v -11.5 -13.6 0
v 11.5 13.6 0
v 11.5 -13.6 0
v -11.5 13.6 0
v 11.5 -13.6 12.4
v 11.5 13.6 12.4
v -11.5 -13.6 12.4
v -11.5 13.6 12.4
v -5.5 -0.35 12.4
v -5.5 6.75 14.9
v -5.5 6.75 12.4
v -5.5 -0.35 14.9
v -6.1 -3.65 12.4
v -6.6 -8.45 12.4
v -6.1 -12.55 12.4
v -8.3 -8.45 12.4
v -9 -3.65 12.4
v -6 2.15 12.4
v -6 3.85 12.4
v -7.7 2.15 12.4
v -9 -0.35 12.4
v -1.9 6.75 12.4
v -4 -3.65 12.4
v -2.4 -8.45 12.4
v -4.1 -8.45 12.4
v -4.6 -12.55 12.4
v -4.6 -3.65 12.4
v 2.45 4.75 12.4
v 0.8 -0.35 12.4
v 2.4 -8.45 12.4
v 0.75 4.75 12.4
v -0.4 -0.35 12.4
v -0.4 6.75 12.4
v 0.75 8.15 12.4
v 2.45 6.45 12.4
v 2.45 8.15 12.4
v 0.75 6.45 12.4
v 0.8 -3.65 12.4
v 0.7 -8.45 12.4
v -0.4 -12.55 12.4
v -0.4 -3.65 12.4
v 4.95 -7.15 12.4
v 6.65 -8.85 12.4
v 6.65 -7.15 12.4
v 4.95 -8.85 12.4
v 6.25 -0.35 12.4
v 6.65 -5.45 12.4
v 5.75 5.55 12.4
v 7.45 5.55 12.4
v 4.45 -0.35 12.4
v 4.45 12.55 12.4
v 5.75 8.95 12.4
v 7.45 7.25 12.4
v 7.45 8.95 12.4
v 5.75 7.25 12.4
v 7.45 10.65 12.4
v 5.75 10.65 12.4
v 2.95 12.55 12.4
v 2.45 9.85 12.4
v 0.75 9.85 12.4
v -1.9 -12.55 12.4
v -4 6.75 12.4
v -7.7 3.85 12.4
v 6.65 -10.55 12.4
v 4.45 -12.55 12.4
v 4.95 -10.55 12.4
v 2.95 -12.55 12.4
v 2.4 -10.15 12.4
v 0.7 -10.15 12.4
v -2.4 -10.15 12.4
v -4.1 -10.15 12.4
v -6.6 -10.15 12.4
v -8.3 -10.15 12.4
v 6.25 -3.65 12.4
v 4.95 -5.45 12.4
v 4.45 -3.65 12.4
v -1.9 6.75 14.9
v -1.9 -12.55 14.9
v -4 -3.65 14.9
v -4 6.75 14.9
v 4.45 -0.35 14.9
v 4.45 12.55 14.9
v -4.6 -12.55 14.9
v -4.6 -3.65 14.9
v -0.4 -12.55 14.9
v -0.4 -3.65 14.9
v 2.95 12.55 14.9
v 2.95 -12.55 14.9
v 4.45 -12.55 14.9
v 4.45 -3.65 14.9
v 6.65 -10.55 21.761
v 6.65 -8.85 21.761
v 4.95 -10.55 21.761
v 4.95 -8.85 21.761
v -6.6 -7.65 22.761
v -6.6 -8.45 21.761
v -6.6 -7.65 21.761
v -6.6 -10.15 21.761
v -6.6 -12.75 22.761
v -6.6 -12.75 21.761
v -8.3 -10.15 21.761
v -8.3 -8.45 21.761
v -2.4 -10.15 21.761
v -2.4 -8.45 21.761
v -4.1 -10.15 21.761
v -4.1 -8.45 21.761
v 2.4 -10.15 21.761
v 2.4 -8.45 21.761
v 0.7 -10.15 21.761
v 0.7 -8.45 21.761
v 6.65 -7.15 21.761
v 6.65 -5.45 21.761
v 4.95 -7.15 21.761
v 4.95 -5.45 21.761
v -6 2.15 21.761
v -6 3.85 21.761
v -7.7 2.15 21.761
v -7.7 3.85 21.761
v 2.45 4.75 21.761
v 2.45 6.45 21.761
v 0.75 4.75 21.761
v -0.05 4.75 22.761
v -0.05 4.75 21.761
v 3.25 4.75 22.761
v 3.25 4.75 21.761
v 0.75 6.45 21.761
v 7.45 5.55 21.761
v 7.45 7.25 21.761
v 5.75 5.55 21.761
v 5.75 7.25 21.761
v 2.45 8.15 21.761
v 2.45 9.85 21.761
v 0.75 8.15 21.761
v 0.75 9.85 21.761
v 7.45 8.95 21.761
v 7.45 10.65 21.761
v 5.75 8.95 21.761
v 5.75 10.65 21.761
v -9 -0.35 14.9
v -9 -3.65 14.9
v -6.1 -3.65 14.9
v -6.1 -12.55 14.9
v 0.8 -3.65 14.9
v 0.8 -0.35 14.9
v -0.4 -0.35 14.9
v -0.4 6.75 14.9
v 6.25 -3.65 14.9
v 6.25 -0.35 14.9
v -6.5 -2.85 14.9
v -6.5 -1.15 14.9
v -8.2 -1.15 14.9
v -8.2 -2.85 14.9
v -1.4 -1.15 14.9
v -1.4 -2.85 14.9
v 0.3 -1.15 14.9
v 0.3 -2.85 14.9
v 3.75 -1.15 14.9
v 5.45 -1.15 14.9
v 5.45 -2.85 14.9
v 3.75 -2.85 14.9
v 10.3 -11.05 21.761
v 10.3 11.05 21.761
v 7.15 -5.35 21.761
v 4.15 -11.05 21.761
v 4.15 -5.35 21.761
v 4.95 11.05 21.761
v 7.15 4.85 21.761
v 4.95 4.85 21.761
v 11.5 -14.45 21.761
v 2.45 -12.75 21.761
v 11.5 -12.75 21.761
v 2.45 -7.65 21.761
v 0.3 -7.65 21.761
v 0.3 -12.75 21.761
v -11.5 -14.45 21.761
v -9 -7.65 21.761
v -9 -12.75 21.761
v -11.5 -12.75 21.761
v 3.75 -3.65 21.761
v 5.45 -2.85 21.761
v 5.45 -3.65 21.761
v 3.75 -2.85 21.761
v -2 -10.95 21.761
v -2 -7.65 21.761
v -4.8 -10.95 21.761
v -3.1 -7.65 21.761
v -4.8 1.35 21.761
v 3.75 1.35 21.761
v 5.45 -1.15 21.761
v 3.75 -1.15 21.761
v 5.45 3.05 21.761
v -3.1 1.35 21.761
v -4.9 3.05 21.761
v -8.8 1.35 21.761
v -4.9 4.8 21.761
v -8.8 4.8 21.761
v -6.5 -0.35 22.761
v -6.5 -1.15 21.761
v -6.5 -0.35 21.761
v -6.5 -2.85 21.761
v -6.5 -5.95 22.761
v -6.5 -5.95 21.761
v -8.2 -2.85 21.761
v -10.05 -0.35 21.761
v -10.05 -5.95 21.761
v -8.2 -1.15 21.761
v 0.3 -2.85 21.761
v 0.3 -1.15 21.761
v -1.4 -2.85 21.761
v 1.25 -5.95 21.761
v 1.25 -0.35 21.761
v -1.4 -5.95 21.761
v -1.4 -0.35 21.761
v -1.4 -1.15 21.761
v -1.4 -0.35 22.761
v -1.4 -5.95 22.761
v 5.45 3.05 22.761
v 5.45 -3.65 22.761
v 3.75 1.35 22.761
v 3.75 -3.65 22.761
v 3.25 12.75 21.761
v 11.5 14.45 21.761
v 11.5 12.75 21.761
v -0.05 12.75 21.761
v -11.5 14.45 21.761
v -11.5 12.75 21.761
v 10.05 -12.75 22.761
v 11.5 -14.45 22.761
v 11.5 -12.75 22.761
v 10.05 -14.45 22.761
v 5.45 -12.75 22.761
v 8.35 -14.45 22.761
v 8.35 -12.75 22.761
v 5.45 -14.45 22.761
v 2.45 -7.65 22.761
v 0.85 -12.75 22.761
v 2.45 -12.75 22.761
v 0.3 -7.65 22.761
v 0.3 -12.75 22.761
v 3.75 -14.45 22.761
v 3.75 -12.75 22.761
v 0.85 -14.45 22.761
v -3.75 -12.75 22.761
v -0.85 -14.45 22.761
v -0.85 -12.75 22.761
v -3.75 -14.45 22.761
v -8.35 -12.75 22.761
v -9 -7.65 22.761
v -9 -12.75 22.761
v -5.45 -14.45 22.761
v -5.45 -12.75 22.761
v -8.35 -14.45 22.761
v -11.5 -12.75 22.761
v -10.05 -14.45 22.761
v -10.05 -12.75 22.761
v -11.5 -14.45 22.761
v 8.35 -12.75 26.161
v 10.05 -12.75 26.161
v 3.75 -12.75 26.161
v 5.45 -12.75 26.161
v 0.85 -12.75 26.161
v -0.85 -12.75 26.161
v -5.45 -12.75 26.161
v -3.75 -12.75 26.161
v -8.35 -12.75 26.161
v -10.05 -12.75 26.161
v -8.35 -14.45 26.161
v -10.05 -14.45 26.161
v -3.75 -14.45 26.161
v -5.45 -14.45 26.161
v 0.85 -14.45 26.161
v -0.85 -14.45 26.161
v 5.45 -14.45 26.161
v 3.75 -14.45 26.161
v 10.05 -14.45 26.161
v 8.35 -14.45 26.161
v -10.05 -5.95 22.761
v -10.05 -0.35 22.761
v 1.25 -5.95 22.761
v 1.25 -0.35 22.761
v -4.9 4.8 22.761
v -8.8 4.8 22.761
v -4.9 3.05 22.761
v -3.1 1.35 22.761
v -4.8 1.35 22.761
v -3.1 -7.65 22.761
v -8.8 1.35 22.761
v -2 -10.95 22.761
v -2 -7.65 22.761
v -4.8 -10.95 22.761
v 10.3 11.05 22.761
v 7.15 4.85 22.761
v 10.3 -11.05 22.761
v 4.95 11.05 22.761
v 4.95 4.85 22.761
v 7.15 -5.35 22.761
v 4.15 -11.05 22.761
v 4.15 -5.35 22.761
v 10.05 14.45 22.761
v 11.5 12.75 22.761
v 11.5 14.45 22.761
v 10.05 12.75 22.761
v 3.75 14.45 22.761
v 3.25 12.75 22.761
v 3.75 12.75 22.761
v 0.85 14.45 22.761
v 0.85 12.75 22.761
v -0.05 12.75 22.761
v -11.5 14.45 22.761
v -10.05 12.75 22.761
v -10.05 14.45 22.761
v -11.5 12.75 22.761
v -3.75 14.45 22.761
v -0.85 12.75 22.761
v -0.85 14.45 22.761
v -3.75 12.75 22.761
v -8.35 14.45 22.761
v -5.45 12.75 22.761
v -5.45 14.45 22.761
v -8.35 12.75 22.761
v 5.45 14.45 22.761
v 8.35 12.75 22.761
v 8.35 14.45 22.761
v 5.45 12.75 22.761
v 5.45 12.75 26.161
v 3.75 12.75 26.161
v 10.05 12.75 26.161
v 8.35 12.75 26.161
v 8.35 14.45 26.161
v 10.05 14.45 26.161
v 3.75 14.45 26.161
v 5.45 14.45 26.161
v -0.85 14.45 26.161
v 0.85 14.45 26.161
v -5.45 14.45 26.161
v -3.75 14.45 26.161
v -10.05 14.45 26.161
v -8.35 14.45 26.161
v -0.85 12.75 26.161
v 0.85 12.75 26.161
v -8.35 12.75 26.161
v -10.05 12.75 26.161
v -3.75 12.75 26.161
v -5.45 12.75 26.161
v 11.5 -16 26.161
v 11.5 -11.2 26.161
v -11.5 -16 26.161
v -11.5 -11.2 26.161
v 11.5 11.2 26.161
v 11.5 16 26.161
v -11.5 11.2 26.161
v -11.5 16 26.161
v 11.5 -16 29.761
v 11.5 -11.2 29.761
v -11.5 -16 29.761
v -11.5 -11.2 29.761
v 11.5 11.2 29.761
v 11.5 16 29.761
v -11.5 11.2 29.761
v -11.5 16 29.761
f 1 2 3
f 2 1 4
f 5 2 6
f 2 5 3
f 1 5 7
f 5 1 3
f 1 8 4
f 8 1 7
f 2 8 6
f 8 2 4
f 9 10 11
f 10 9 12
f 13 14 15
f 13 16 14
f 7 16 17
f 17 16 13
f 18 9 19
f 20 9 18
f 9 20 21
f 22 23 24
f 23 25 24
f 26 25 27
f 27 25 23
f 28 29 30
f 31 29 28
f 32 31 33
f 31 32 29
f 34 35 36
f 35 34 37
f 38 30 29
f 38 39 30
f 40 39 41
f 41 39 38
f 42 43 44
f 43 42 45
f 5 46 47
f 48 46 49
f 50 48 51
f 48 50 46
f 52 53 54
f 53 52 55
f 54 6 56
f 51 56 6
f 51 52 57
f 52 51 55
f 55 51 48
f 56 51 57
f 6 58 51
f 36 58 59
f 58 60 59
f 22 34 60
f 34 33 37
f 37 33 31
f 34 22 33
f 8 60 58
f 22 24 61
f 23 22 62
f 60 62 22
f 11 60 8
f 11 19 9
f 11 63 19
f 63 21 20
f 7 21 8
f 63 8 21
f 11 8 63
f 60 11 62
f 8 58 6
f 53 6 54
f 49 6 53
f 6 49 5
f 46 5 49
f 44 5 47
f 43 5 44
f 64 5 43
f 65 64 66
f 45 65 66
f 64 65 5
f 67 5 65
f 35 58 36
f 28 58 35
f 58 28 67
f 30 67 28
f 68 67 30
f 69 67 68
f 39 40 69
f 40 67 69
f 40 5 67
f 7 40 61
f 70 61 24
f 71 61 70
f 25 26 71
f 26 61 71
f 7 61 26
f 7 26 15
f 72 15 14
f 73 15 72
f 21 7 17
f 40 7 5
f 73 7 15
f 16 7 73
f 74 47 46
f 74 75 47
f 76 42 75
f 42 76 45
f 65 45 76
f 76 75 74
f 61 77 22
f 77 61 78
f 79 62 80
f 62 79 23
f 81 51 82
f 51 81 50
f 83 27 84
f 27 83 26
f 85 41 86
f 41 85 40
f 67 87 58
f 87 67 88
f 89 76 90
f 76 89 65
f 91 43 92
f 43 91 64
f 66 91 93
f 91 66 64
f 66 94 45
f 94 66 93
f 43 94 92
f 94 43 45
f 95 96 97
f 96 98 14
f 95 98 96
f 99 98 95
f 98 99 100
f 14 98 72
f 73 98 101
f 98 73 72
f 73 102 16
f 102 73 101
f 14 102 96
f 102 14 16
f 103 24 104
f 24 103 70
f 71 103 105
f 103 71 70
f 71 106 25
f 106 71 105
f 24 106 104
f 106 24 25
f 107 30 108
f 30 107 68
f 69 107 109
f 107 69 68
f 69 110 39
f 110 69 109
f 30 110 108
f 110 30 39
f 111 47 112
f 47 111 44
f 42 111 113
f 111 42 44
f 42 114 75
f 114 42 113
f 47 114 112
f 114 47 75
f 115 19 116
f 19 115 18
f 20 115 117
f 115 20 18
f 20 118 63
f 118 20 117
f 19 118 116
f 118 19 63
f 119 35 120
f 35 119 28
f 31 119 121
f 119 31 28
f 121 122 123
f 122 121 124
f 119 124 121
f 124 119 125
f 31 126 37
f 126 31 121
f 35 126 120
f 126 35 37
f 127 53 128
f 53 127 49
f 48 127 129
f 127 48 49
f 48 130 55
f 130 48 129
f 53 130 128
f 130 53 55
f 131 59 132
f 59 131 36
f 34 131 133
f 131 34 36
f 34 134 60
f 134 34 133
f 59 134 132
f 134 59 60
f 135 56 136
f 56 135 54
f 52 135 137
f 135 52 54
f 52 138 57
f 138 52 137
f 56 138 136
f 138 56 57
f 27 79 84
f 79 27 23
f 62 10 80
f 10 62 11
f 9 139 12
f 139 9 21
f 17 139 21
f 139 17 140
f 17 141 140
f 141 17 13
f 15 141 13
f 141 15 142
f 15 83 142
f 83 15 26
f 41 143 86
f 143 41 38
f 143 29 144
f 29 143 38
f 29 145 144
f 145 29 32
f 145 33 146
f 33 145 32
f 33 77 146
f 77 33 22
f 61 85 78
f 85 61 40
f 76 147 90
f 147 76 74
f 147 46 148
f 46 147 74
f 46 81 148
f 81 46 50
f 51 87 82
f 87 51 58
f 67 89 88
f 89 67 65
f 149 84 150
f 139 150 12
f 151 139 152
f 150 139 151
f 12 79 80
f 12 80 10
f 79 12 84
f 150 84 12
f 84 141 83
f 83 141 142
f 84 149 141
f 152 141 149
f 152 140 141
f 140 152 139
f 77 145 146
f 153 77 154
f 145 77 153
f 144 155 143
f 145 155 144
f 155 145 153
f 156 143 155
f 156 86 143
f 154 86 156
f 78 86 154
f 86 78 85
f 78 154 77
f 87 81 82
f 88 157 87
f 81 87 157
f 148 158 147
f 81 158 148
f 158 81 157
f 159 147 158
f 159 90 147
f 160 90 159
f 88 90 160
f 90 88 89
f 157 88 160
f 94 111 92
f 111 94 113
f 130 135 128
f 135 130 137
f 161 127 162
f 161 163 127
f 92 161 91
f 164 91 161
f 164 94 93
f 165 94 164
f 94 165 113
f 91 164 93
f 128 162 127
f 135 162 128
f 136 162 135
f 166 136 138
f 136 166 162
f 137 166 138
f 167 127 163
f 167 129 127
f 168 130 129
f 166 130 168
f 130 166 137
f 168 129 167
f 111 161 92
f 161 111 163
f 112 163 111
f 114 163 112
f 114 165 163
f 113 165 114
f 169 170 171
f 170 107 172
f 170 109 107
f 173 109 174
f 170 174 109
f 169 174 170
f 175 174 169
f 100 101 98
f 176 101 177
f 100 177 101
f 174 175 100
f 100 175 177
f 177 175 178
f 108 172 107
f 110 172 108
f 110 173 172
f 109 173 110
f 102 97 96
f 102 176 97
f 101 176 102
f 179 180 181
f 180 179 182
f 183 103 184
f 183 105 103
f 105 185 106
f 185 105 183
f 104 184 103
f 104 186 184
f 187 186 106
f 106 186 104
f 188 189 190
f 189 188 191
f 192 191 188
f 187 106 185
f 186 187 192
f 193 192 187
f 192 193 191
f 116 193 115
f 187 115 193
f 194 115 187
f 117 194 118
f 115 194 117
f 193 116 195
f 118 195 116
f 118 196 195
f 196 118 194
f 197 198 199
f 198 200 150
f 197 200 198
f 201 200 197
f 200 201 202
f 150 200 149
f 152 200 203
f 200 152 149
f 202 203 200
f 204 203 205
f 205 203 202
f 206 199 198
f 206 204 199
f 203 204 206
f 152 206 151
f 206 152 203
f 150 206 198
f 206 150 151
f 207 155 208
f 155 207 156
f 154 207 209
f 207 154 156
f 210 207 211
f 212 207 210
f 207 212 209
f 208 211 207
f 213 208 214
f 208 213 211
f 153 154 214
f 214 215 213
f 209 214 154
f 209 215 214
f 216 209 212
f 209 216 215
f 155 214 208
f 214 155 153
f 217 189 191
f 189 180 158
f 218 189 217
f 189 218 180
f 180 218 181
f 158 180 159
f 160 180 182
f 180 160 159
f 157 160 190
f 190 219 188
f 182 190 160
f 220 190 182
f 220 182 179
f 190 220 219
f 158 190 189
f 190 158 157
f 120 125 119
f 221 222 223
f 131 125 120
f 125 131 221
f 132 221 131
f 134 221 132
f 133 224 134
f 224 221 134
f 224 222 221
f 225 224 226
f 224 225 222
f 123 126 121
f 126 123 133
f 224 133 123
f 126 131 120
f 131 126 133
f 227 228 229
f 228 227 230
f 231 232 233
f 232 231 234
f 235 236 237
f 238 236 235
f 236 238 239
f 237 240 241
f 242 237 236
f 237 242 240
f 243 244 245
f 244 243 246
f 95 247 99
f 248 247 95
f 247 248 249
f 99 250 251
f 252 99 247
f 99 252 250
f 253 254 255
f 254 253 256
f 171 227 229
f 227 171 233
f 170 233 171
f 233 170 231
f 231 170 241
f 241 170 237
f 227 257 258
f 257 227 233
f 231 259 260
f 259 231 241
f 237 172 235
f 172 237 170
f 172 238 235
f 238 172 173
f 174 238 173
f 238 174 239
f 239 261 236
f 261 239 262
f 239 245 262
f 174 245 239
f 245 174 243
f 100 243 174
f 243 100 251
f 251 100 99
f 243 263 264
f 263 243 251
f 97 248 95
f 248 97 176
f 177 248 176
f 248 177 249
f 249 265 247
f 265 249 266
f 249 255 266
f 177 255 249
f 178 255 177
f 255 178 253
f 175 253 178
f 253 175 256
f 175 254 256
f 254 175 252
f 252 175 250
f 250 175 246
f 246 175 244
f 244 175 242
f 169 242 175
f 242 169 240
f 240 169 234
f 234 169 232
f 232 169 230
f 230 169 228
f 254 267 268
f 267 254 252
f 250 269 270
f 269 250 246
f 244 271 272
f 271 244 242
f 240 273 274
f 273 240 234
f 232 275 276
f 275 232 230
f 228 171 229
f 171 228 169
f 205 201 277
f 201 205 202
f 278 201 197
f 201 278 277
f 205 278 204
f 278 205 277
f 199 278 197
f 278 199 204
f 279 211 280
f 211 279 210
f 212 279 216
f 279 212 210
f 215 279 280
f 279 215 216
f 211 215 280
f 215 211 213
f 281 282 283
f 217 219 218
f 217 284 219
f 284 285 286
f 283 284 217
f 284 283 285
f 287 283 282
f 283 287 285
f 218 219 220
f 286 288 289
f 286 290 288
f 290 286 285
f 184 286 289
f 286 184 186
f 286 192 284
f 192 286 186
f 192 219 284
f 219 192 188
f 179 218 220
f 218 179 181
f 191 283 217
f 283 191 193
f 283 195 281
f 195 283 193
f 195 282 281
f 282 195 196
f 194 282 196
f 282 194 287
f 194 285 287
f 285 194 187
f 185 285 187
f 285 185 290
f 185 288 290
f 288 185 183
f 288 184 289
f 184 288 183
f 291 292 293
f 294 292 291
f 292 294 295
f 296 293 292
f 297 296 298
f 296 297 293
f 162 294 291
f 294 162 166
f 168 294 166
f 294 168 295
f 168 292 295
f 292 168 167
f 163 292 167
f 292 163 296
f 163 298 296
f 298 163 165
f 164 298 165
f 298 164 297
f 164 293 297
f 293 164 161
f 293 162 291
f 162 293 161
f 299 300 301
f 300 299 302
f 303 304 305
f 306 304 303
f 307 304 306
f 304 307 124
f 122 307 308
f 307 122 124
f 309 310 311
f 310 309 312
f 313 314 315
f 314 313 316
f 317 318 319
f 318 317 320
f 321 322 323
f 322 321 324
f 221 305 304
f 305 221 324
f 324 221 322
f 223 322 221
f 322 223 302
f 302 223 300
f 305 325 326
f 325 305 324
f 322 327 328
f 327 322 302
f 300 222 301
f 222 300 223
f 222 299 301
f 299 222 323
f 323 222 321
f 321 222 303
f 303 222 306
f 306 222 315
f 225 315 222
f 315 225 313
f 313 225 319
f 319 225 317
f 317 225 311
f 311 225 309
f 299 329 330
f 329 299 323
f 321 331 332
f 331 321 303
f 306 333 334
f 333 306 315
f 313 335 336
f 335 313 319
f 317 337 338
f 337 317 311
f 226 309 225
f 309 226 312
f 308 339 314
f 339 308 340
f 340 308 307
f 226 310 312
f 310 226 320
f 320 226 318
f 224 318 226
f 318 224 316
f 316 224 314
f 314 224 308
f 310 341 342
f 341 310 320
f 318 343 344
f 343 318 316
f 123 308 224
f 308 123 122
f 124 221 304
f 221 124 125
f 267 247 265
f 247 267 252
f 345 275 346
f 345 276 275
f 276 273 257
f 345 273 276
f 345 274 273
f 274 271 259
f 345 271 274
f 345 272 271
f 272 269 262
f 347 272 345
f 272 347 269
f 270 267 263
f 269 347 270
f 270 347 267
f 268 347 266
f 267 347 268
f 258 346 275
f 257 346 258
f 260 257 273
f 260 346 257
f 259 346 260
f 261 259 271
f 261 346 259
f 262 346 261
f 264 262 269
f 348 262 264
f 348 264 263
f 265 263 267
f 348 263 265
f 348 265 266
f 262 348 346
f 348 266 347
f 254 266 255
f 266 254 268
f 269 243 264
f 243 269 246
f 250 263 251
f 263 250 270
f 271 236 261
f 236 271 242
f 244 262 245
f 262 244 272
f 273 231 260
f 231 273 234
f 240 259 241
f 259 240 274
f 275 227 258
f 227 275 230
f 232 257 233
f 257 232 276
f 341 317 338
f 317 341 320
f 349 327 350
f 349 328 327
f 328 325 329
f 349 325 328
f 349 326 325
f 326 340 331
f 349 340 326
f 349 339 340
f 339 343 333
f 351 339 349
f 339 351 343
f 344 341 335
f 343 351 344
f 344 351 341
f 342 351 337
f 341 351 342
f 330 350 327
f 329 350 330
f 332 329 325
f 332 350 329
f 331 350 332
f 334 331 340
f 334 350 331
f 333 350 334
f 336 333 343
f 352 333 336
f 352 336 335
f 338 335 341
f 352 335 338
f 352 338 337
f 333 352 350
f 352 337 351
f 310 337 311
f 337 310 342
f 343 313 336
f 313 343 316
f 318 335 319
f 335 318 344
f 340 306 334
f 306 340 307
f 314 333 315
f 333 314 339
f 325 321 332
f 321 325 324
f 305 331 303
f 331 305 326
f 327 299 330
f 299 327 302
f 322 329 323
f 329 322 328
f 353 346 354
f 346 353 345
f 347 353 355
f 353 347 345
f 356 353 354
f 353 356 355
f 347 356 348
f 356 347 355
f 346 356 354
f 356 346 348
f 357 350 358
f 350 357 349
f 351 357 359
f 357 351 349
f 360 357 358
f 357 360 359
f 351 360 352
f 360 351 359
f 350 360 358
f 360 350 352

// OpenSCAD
// Generated by SolidPython 0.4.2 on 2020-09-29 23:22:09
//!OpenSCAD

scale(v = 0.0100000000) {
	translate(v = [-1150, -1360, 0]) {
		union() {
			color(c = [0.4000000000, 0.4000000000, 0.4000000000]) {
				translate(v = [0, 0, 0]) {
					linear_extrude(height = 1000.0000000000) {
						polygon(paths = [[0, 1, 2, 3]], points = [[0, 0], [0, 2720], [2300, 2720], [2300, 0]]);
					}
				}
			}
			color(c = [0.2000000000, 0.6000000000, 0.2000000000]) {
				translate(v = [0, 0, 1000.0000000000]) {
					linear_extrude(height = 120.0000000000) {
						polygon(paths = [[0, 1, 2, 3]], points = [[0, 1305], [0, 2720], [2300, 2720], [2300, 1305]]);
					}
				}
			}
			color(c = [0.4000000000, 0.4000000000, 0.4000000000]) {
				translate(v = [0, 0, 1000.0000000000]) {
					linear_extrude(height = 120.0000000000) {
						polygon(paths = [[0, 1, 2, 3]], points = [[0, 0], [0, 1305], [2300, 1305], [2300, 0]]);
					}
				}
			}
			color(c = [0.9000000000, 0.6000000000, 0.6000000000]) {
				translate(v = [0, 0, 1120.0000000000]) {
					linear_extrude(height = 120.0000000000) {
						polygon(paths = [[0, 1, 2, 3]], points = [[340, 1485], [340, 1905], [600, 1905], [600, 1485]]);
					}
				}
			}
			color(c = [0.9000000000, 0.6000000000, 0.6000000000]) {
				translate(v = [0, 0, 1120.0000000000]) {
					linear_extrude(height = 120.0000000000) {
						polygon(paths = [[0, 1, 2, 3]], points = [[750, 1485], [750, 1905], [960, 1905], [960, 1485]]);
					}
				}
			}
			color(c = [0.9000000000, 0.6000000000, 0.6000000000]) {
				translate(v = [0, 0, 1120.0000000000]) {
					linear_extrude(height = 120.0000000000) {
						polygon(paths = [[0, 1, 2, 3, 4, 5]], points = [[1110, 1485], [1110, 1905], [1185, 1905], [1185, 2485], [1445, 2485], [1445, 1485]]);
					}
				}
			}
			color(c = [0.9000000000, 0.6000000000, 0.6000000000]) {
				translate(v = [0, 0, 1120.0000000000]) {
					linear_extrude(height = 120.0000000000) {
						polygon(paths = [[0, 1, 2, 3]], points = [[1595, 1485], [1595, 2485], [1935, 2485], [1935, 1485]]);
					}
				}
			}
			color(c = [0.9000000000, 0.6000000000, 0.9000000000]) {
				translate(v = [0, 0, 1120.0000000000]) {
					linear_extrude(height = 120.0000000000) {
						polygon(paths = [[0, 1, 2, 3]], points = [[280, 235], [280, 655], [540, 655], [540, 235]]);
					}
				}
			}
			color(c = [0.9000000000, 0.6000000000, 0.9000000000]) {
				translate(v = [0, 0, 1120.0000000000]) {
					linear_extrude(height = 120.0000000000) {
						polygon(paths = [[0, 1, 2, 3]], points = [[690, 235], [690, 655], [960, 655], [960, 235]]);
					}
				}
			}
			color(c = [0.9000000000, 0.6000000000, 0.9000000000]) {
				translate(v = [0, 0, 1120.0000000000]) {
					linear_extrude(height = 120.0000000000) {
						polygon(paths = [[0, 1, 2, 3, 4, 5]], points = [[1110, 235], [1110, 655], [1185, 655], [1185, 885], [1445, 885], [1445, 235]]);
					}
				}
			}
			color(c = [0.9000000000, 0.6000000000, 0.9000000000]) {
				translate(v = [0, 0, 1120.0000000000]) {
					linear_extrude(height = 120.0000000000) {
						polygon(paths = [[0, 1, 2, 3]], points = [[1595, 235], [1595, 885], [1855, 885], [1855, 235]]);
					}
				}
			}
			color(c = [0.2000000000, 0.6000000000, 0.2000000000]) {
				translate(v = [0, 0, 1120.0000000000]) {
					linear_extrude(height = 120.0000000000) {
						difference() {
							polygon(paths = [[0, 1, 2, 3]], points = [[0, 1305], [0, 2720], [2300, 2720], [2300, 1305]]);
							polygon(paths = [[0, 1, 2, 3]], points = [[340, 1485], [600, 1485], [600, 1905], [340, 1905]]);
							polygon(paths = [[0, 1, 2, 3]], points = [[750, 1485], [960, 1485], [960, 1905], [750, 1905]]);
							polygon(paths = [[0, 1, 2, 3]], points = [[1595, 1485], [1935, 1485], [1935, 2485], [1595, 2485]]);
							polygon(paths = [[0, 1, 2, 3, 4, 5]], points = [[1110, 1485], [1445, 1485], [1445, 2485], [1185, 2485], [1185, 1905], [1110, 1905]]);
						}
					}
				}
			}
			color(c = [0.4000000000, 0.4000000000, 0.4000000000]) {
				translate(v = [0, 0, 1120.0000000000]) {
					linear_extrude(height = 120.0000000000) {
						difference() {
							polygon(paths = [[0, 1, 2, 3]], points = [[0, 0], [0, 1305], [2300, 1305], [2300, 0]]);
							polygon(paths = [[0, 1, 2, 3]], points = [[280, 235], [540, 235], [540, 655], [280, 655]]);
							polygon(paths = [[0, 1, 2, 3]], points = [[690, 235], [960, 235], [960, 655], [690, 655]]);
							polygon(paths = [[0, 1, 2, 3]], points = [[1595, 235], [1855, 235], [1855, 885], [1595, 885]]);
							polygon(paths = [[0, 1, 2, 3, 4, 5]], points = [[1110, 235], [1445, 235], [1445, 885], [1185, 885], [1185, 655], [1110, 655]]);
						}
					}
				}
			}
			color(c = [0.1000000000, 0.1000000000, 0.1000000000]) {
				translate(v = [0, 0, 1240.0000000000]) {
					linear_extrude(height = 70.0000000000) {
						polygon(paths = [[0, 1, 2, 3]], points = [[1645, 305], [1645, 475], [1815, 475], [1815, 305]]);
					}
				}
			}
			color(c = [0.1000000000, 0.1000000000, 0.1000000000]) {
				translate(v = [0, 0, 1240.0000000000]) {
					linear_extrude(height = 70.0000000000) {
						polygon(paths = [[0, 1, 2, 3]], points = [[320, 345], [320, 515], [490, 515], [490, 345]]);
					}
				}
			}
			color(c = [0.1000000000, 0.1000000000, 0.1000000000]) {
				translate(v = [0, 0, 1240.0000000000]) {
					linear_extrude(height = 70.0000000000) {
						polygon(paths = [[0, 1, 2, 3]], points = [[740, 345], [740, 515], [910, 515], [910, 345]]);
					}
				}
			}
			color(c = [0.1000000000, 0.1000000000, 0.1000000000]) {
				translate(v = [0, 0, 1240.0000000000]) {
					linear_extrude(height = 70.0000000000) {
						polygon(paths = [[0, 1, 2, 3]], points = [[1220, 345], [1220, 515], [1390, 515], [1390, 345]]);
					}
				}
			}
			color(c = [0.1000000000, 0.1000000000, 0.1000000000]) {
				translate(v = [0, 0, 1240.0000000000]) {
					linear_extrude(height = 70.0000000000) {
						polygon(paths = [[0, 1, 2, 3]], points = [[1645, 645], [1645, 815], [1815, 815], [1815, 645]]);
					}
				}
			}
			color(c = [0.1000000000, 0.1000000000, 0.1000000000]) {
				translate(v = [0, 0, 1240.0000000000]) {
					linear_extrude(height = 70.0000000000) {
						polygon(paths = [[0, 1, 2, 3]], points = [[380, 1575], [380, 1745], [550, 1745], [550, 1575]]);
					}
				}
			}
			color(c = [0.1000000000, 0.1000000000, 0.1000000000]) {
				translate(v = [0, 0, 1240.0000000000]) {
					linear_extrude(height = 70.0000000000) {
						polygon(paths = [[0, 1, 2, 3]], points = [[1225, 1835], [1225, 2005], [1395, 2005], [1395, 1835]]);
					}
				}
			}
			color(c = [0.1000000000, 0.1000000000, 0.1000000000]) {
				translate(v = [0, 0, 1240.0000000000]) {
					linear_extrude(height = 70.0000000000) {
						polygon(paths = [[0, 1, 2, 3]], points = [[1725, 1915], [1725, 2085], [1895, 2085], [1895, 1915]]);
					}
				}
			}
			color(c = [0.1000000000, 0.1000000000, 0.1000000000]) {
				translate(v = [0, 0, 1240.0000000000]) {
					linear_extrude(height = 70.0000000000) {
						polygon(paths = [[0, 1, 2, 3]], points = [[1225, 2175], [1225, 2345], [1395, 2345], [1395, 2175]]);
					}
				}
			}
			color(c = [0.1000000000, 0.1000000000, 0.1000000000]) {
				translate(v = [0, 0, 1240.0000000000]) {
					linear_extrude(height = 70.0000000000) {
						polygon(paths = [[0, 1, 2, 3]], points = [[1725, 2255], [1725, 2425], [1895, 2425], [1895, 2255]]);
					}
				}
			}
			color(c = [1.0000000000, 1.0000000000, 1.0000000000]) {
				translate(v = [0, 0, 1240.0000000000]) {
					linear_extrude(height = 70.0000000000) {
						polygon(paths = [[0, 1, 2, 3, 4, 5, 6, 7, 8, 9]], points = [[540, 105], [540, 995], [250, 995], [250, 1325], [600, 1325], [600, 2035], [750, 2035], [750, 995], [690, 995], [690, 105]]);
					}
				}
			}
			color(c = [1.0000000000, 1.0000000000, 1.0000000000]) {
				translate(v = [0, 0, 1240.0000000000]) {
					linear_extrude(height = 70.0000000000) {
						polygon(paths = [[0, 1, 2, 3, 4, 5, 6, 7]], points = [[960, 105], [960, 2035], [1110, 2035], [1110, 1325], [1230, 1325], [1230, 995], [1110, 995], [1110, 105]]);
					}
				}
			}
			color(c = [1.0000000000, 1.0000000000, 1.0000000000]) {
				translate(v = [0, 0, 1240.0000000000]) {
					linear_extrude(height = 70.0000000000) {
						polygon(paths = [[0, 1, 2, 3, 4, 5, 6, 7]], points = [[1445, 105], [1445, 2615], [1595, 2615], [1595, 1325], [1775, 1325], [1775, 995], [1595, 995], [1595, 105]]);
					}
				}
			}
			color(c = [0.1000000000, 0.1000000000, 0.1000000000]) {
				translate(v = [0, 0, 1310.0000000000]) {
					linear_extrude(height = 180.0000000000) {
						polygon(paths = [[0, 1, 2, 3]], points = [[1645, 305], [1645, 475], [1815, 475], [1815, 305]]);
					}
				}
			}
			color(c = [0.1000000000, 0.1000000000, 0.1000000000]) {
				translate(v = [0, 0, 1310.0000000000]) {
					linear_extrude(height = 180.0000000000) {
						polygon(paths = [[0, 1, 2, 3]], points = [[320, 345], [320, 515], [490, 515], [490, 345]]);
					}
				}
			}
			color(c = [0.1000000000, 0.1000000000, 0.1000000000]) {
				translate(v = [0, 0, 1310.0000000000]) {
					linear_extrude(height = 180.0000000000) {
						polygon(paths = [[0, 1, 2, 3]], points = [[740, 345], [740, 515], [910, 515], [910, 345]]);
					}
				}
			}
			color(c = [0.1000000000, 0.1000000000, 0.1000000000]) {
				translate(v = [0, 0, 1310.0000000000]) {
					linear_extrude(height = 180.0000000000) {
						polygon(paths = [[0, 1, 2, 3]], points = [[1220, 345], [1220, 515], [1390, 515], [1390, 345]]);
					}
				}
			}
			color(c = [0.1000000000, 0.1000000000, 0.1000000000]) {
				translate(v = [0, 0, 1310.0000000000]) {
					linear_extrude(height = 180.0000000000) {
						polygon(paths = [[0, 1, 2, 3]], points = [[1645, 645], [1645, 815], [1815, 815], [1815, 645]]);
					}
				}
			}
			color(c = [0.1000000000, 0.1000000000, 0.1000000000]) {
				translate(v = [0, 0, 1310.0000000000]) {
					linear_extrude(height = 180.0000000000) {
						polygon(paths = [[0, 1, 2, 3]], points = [[380, 1575], [380, 1745], [550, 1745], [550, 1575]]);
					}
				}
			}
			color(c = [0.1000000000, 0.1000000000, 0.1000000000]) {
				translate(v = [0, 0, 1310.0000000000]) {
					linear_extrude(height = 180.0000000000) {
						polygon(paths = [[0, 1, 2, 3]], points = [[1225, 1835], [1225, 2005], [1395, 2005], [1395, 1835]]);
					}
				}
			}
			color(c = [0.1000000000, 0.1000000000, 0.1000000000]) {
				translate(v = [0, 0, 1310.0000000000]) {
					linear_extrude(height = 180.0000000000) {
						polygon(paths = [[0, 1, 2, 3]], points = [[1725, 1915], [1725, 2085], [1895, 2085], [1895, 1915]]);
					}
				}
			}
			color(c = [0.1000000000, 0.1000000000, 0.1000000000]) {
				translate(v = [0, 0, 1310.0000000000]) {
					linear_extrude(height = 180.0000000000) {
						polygon(paths = [[0, 1, 2, 3]], points = [[1225, 2175], [1225, 2345], [1395, 2345], [1395, 2175]]);
					}
				}
			}
			color(c = [0.1000000000, 0.1000000000, 0.1000000000]) {
				translate(v = [0, 0, 1310.0000000000]) {
					linear_extrude(height = 180.0000000000) {
						polygon(paths = [[0, 1, 2, 3]], points = [[1725, 2255], [1725, 2425], [1895, 2425], [1895, 2255]]);
					}
				}
			}
			color(c = [0.7000000000, 0, 0]) {
				translate(v = [0, 0, 1310.0000000000]) {
					linear_extrude(height = 180.0000000000) {
						polygon(paths = [[0, 1, 2, 3, 4, 5, 6, 7, 8, 9]], points = [[540, 105], [540, 995], [250, 995], [250, 1325], [600, 1325], [600, 2035], [750, 2035], [750, 995], [690, 995], [690, 105]]);
					}
				}
			}
			color(c = [0.7000000000, 0, 0]) {
				translate(v = [0, 0, 1310.0000000000]) {
					linear_extrude(height = 180.0000000000) {
						polygon(paths = [[0, 1, 2, 3, 4, 5, 6, 7]], points = [[960, 105], [960, 2035], [1110, 2035], [1110, 1325], [1230, 1325], [1230, 995], [1110, 995], [1110, 105]]);
					}
				}
			}
			color(c = [0.7000000000, 0, 0]) {
				translate(v = [0, 0, 1310.0000000000]) {
					linear_extrude(height = 180.0000000000) {
						polygon(paths = [[0, 1, 2, 3, 4, 5, 6, 7]], points = [[1445, 105], [1445, 2615], [1595, 2615], [1595, 1325], [1775, 1325], [1775, 995], [1595, 995], [1595, 105]]);
					}
				}
			}
			color(c = [0.1000000000, 0.1000000000, 0.1000000000]) {
				translate(v = [0, 0, 1490.0000000000]) {
					linear_extrude(height = 686.1000000000) {
						polygon(paths = [[0, 1, 2, 3]], points = [[1645, 305], [1645, 475], [1815, 475], [1815, 305]]);
					}
				}
			}
			color(c = [0.1000000000, 0.1000000000, 0.1000000000]) {
				translate(v = [0, 0, 1490.0000000000]) {
					linear_extrude(height = 686.1000000000) {
						polygon(paths = [[0, 1, 2, 3]], points = [[320, 345], [320, 515], [490, 515], [490, 345]]);
					}
				}
			}
			color(c = [0.1000000000, 0.1000000000, 0.1000000000]) {
				translate(v = [0, 0, 1490.0000000000]) {
					linear_extrude(height = 686.1000000000) {
						polygon(paths = [[0, 1, 2, 3]], points = [[740, 345], [740, 515], [910, 515], [910, 345]]);
					}
				}
			}
			color(c = [0.1000000000, 0.1000000000, 0.1000000000]) {
				translate(v = [0, 0, 1490.0000000000]) {
					linear_extrude(height = 686.1000000000) {
						polygon(paths = [[0, 1, 2, 3]], points = [[1220, 345], [1220, 515], [1390, 515], [1390, 345]]);
					}
				}
			}
			color(c = [0.1000000000, 0.1000000000, 0.1000000000]) {
				translate(v = [0, 0, 1490.0000000000]) {
					linear_extrude(height = 686.1000000000) {
						polygon(paths = [[0, 1, 2, 3]], points = [[1645, 645], [1645, 815], [1815, 815], [1815, 645]]);
					}
				}
			}
			color(c = [0.1000000000, 0.1000000000, 0.1000000000]) {
				translate(v = [0, 0, 1490.0000000000]) {
					linear_extrude(height = 686.1000000000) {
						polygon(paths = [[0, 1, 2, 3]], points = [[330, 1075], [330, 1245], [500, 1245], [500, 1075]]);
					}
				}
			}
			color(c = [0.1000000000, 0.1000000000, 0.1000000000]) {
				translate(v = [0, 0, 1490.0000000000]) {
					linear_extrude(height = 686.1000000000) {
						polygon(paths = [[0, 1, 2, 3]], points = [[1010, 1075], [1010, 1245], [1180, 1245], [1180, 1075]]);
					}
				}
			}
			color(c = [0.1000000000, 0.1000000000, 0.1000000000]) {
				translate(v = [0, 0, 1490.0000000000]) {
					linear_extrude(height = 686.1000000000) {
						polygon(paths = [[0, 1, 2, 3]], points = [[1525, 1075], [1525, 1245], [1695, 1245], [1695, 1075]]);
					}
				}
			}
			color(c = [0.1000000000, 0.1000000000, 0.1000000000]) {
				translate(v = [0, 0, 1490.0000000000]) {
					linear_extrude(height = 686.1000000000) {
						polygon(paths = [[0, 1, 2, 3]], points = [[380, 1575], [380, 1745], [550, 1745], [550, 1575]]);
					}
				}
			}
			color(c = [0.1000000000, 0.1000000000, 0.1000000000]) {
				translate(v = [0, 0, 1490.0000000000]) {
					linear_extrude(height = 686.1000000000) {
						polygon(paths = [[0, 1, 2, 3]], points = [[1225, 1835], [1225, 2005], [1395, 2005], [1395, 1835]]);
					}
				}
			}
			color(c = [0.1000000000, 0.1000000000, 0.1000000000]) {
				translate(v = [0, 0, 1490.0000000000]) {
					linear_extrude(height = 686.1000000000) {
						polygon(paths = [[0, 1, 2, 3]], points = [[1725, 1915], [1725, 2085], [1895, 2085], [1895, 1915]]);
					}
				}
			}
			color(c = [0.1000000000, 0.1000000000, 0.1000000000]) {
				translate(v = [0, 0, 1490.0000000000]) {
					linear_extrude(height = 686.1000000000) {
						polygon(paths = [[0, 1, 2, 3]], points = [[1225, 2175], [1225, 2345], [1395, 2345], [1395, 2175]]);
					}
				}
			}
			color(c = [0.1000000000, 0.1000000000, 0.1000000000]) {
				translate(v = [0, 0, 1490.0000000000]) {
					linear_extrude(height = 686.1000000000) {
						polygon(paths = [[0, 1, 2, 3]], points = [[1725, 2255], [1725, 2425], [1895, 2425], [1895, 2255]]);
					}
				}
			}
			color(c = [0.9000000000, 0.6000000000, 0.6000000000]) {
				translate(v = [0, 0, 2176.1000000000]) {
					linear_extrude(height = 100.0000000000) {
						polygon(paths = [[0, 1, 2, 3, 4, 5, 6, 7, 8, 9, 10, 11]], points = [[0, -85], [0, 85], [250, 85], [250, 595], [490, 595], [490, 85], [1180, 85], [1180, 595], [1395, 595], [1395, 85], [2300, 85], [2300, -85]]);
					}
				}
			}
			color(c = [0.9000000000, 0.6000000000, 0.6000000000]) {
				translate(v = [0, 0, 2176.1000000000]) {
					linear_extrude(height = 100.0000000000) {
						polygon(paths = [[0, 1, 2, 3]], points = [[145, 765], [145, 1325], [500, 1325], [500, 765]]);
					}
				}
			}
			color(c = [0.9000000000, 0.6000000000, 0.6000000000]) {
				translate(v = [0, 0, 2176.1000000000]) {
					linear_extrude(height = 100.0000000000) {
						polygon(paths = [[0, 1, 2, 3]], points = [[1010, 765], [1010, 1325], [1275, 1325], [1275, 765]]);
					}
				}
			}
			color(c = [0.9000000000, 0.6000000000, 0.6000000000]) {
				translate(v = [0, 0, 2176.1000000000]) {
					linear_extrude(height = 100.0000000000) {
						polygon(paths = [[0, 1, 2, 3, 4, 5, 6, 7, 8, 9, 10, 11, 12, 13]], points = [[670, 265], [670, 1495], [270, 1495], [270, 1840], [660, 1840], [660, 1665], [1695, 1665], [1695, 995], [1525, 995], [1525, 1495], [840, 1495], [840, 595], [950, 595], [950, 265]]);
					}
				}
			}
			color(c = [0.9000000000, 0.6000000000, 0.6000000000]) {
				translate(v = [0, 0, 2176.1000000000]) {
					linear_extrude(height = 100.0000000000) {
						polygon(paths = [[0, 1, 2, 3, 4, 5, 6, 7]], points = [[1565, 255], [1565, 825], [1865, 825], [1865, 1845], [1645, 1845], [1645, 2465], [2180, 2465], [2180, 255]]);
					}
				}
			}
			color(c = [0.9000000000, 0.6000000000, 0.6000000000]) {
				translate(v = [0, 0, 2176.1000000000]) {
					linear_extrude(height = 100.0000000000) {
						polygon(paths = [[0, 1, 2, 3, 4, 5, 6, 7]], points = [[1145, 1835], [1145, 2635], [0, 2635], [0, 2805], [2300, 2805], [2300, 2635], [1475, 2635], [1475, 1835]]);
					}
				}
			}
			color(c = [0.5000000000, 0.5000000000, 0.5000000000]) {
				translate(v = [0, 0, 2276.1000000000]) {
					linear_extrude(height = 340.0000000000) {
						polygon(paths = [[0, 1, 2, 3]], points = [[145, -85], [145, 85], [315, 85], [315, -85]]);
					}
				}
			}
			color(c = [0.5000000000, 0.5000000000, 0.5000000000]) {
				translate(v = [0, 0, 2276.1000000000]) {
					linear_extrude(height = 340.0000000000) {
						polygon(paths = [[0, 1, 2, 3]], points = [[605, -85], [605, 85], [775, 85], [775, -85]]);
					}
				}
			}
			color(c = [0.5000000000, 0.5000000000, 0.5000000000]) {
				translate(v = [0, 0, 2276.1000000000]) {
					linear_extrude(height = 340.0000000000) {
						polygon(paths = [[0, 1, 2, 3]], points = [[1065, -85], [1065, 85], [1235, 85], [1235, -85]]);
					}
				}
			}
			color(c = [0.5000000000, 0.5000000000, 0.5000000000]) {
				translate(v = [0, 0, 2276.1000000000]) {
					linear_extrude(height = 340.0000000000) {
						polygon(paths = [[0, 1, 2, 3]], points = [[1525, -85], [1525, 85], [1695, 85], [1695, -85]]);
					}
				}
			}
			color(c = [0.5000000000, 0.5000000000, 0.5000000000]) {
				translate(v = [0, 0, 2276.1000000000]) {
					linear_extrude(height = 340.0000000000) {
						polygon(paths = [[0, 1, 2, 3]], points = [[1985, -85], [1985, 85], [2155, 85], [2155, -85]]);
					}
				}
			}
			color(c = [0.5000000000, 0.5000000000, 0.5000000000]) {
				translate(v = [0, 0, 2276.1000000000]) {
					linear_extrude(height = 340.0000000000) {
						polygon(paths = [[0, 1, 2, 3]], points = [[145, 2635], [145, 2805], [315, 2805], [315, 2635]]);
					}
				}
			}
			color(c = [0.5000000000, 0.5000000000, 0.5000000000]) {
				translate(v = [0, 0, 2276.1000000000]) {
					linear_extrude(height = 340.0000000000) {
						polygon(paths = [[0, 1, 2, 3]], points = [[605, 2635], [605, 2805], [775, 2805], [775, 2635]]);
					}
				}
			}
			color(c = [0.5000000000, 0.5000000000, 0.5000000000]) {
				translate(v = [0, 0, 2276.1000000000]) {
					linear_extrude(height = 340.0000000000) {
						polygon(paths = [[0, 1, 2, 3]], points = [[1065, 2635], [1065, 2805], [1235, 2805], [1235, 2635]]);
					}
				}
			}
			color(c = [0.5000000000, 0.5000000000, 0.5000000000]) {
				translate(v = [0, 0, 2276.1000000000]) {
					linear_extrude(height = 340.0000000000) {
						polygon(paths = [[0, 1, 2, 3]], points = [[1525, 2635], [1525, 2805], [1695, 2805], [1695, 2635]]);
					}
				}
			}
			color(c = [0.5000000000, 0.5000000000, 0.5000000000]) {
				translate(v = [0, 0, 2276.1000000000]) {
					linear_extrude(height = 340.0000000000) {
						polygon(paths = [[0, 1, 2, 3]], points = [[1985, 2635], [1985, 2805], [2155, 2805], [2155, 2635]]);
					}
				}
			}
			color(c = [0.3000000000, 0.3000000000, 1]) {
				translate(v = [0, 0, 2616.1000000000]) {
					linear_extrude(height = 360.0000000000) {
						polygon(paths = [[0, 1, 2, 3]], points = [[0, -240], [0, 240], [2300, 240], [2300, -240]]);
					}
				}
			}
			color(c = [0.3000000000, 0.3000000000, 1]) {
				translate(v = [0, 0, 2616.1000000000]) {
					linear_extrude(height = 360.0000000000) {
						polygon(paths = [[0, 1, 2, 3]], points = [[0, 2480], [0, 2960], [2300, 2960], [2300, 2480]]);
					}
				}
			}
		}
	}
}
